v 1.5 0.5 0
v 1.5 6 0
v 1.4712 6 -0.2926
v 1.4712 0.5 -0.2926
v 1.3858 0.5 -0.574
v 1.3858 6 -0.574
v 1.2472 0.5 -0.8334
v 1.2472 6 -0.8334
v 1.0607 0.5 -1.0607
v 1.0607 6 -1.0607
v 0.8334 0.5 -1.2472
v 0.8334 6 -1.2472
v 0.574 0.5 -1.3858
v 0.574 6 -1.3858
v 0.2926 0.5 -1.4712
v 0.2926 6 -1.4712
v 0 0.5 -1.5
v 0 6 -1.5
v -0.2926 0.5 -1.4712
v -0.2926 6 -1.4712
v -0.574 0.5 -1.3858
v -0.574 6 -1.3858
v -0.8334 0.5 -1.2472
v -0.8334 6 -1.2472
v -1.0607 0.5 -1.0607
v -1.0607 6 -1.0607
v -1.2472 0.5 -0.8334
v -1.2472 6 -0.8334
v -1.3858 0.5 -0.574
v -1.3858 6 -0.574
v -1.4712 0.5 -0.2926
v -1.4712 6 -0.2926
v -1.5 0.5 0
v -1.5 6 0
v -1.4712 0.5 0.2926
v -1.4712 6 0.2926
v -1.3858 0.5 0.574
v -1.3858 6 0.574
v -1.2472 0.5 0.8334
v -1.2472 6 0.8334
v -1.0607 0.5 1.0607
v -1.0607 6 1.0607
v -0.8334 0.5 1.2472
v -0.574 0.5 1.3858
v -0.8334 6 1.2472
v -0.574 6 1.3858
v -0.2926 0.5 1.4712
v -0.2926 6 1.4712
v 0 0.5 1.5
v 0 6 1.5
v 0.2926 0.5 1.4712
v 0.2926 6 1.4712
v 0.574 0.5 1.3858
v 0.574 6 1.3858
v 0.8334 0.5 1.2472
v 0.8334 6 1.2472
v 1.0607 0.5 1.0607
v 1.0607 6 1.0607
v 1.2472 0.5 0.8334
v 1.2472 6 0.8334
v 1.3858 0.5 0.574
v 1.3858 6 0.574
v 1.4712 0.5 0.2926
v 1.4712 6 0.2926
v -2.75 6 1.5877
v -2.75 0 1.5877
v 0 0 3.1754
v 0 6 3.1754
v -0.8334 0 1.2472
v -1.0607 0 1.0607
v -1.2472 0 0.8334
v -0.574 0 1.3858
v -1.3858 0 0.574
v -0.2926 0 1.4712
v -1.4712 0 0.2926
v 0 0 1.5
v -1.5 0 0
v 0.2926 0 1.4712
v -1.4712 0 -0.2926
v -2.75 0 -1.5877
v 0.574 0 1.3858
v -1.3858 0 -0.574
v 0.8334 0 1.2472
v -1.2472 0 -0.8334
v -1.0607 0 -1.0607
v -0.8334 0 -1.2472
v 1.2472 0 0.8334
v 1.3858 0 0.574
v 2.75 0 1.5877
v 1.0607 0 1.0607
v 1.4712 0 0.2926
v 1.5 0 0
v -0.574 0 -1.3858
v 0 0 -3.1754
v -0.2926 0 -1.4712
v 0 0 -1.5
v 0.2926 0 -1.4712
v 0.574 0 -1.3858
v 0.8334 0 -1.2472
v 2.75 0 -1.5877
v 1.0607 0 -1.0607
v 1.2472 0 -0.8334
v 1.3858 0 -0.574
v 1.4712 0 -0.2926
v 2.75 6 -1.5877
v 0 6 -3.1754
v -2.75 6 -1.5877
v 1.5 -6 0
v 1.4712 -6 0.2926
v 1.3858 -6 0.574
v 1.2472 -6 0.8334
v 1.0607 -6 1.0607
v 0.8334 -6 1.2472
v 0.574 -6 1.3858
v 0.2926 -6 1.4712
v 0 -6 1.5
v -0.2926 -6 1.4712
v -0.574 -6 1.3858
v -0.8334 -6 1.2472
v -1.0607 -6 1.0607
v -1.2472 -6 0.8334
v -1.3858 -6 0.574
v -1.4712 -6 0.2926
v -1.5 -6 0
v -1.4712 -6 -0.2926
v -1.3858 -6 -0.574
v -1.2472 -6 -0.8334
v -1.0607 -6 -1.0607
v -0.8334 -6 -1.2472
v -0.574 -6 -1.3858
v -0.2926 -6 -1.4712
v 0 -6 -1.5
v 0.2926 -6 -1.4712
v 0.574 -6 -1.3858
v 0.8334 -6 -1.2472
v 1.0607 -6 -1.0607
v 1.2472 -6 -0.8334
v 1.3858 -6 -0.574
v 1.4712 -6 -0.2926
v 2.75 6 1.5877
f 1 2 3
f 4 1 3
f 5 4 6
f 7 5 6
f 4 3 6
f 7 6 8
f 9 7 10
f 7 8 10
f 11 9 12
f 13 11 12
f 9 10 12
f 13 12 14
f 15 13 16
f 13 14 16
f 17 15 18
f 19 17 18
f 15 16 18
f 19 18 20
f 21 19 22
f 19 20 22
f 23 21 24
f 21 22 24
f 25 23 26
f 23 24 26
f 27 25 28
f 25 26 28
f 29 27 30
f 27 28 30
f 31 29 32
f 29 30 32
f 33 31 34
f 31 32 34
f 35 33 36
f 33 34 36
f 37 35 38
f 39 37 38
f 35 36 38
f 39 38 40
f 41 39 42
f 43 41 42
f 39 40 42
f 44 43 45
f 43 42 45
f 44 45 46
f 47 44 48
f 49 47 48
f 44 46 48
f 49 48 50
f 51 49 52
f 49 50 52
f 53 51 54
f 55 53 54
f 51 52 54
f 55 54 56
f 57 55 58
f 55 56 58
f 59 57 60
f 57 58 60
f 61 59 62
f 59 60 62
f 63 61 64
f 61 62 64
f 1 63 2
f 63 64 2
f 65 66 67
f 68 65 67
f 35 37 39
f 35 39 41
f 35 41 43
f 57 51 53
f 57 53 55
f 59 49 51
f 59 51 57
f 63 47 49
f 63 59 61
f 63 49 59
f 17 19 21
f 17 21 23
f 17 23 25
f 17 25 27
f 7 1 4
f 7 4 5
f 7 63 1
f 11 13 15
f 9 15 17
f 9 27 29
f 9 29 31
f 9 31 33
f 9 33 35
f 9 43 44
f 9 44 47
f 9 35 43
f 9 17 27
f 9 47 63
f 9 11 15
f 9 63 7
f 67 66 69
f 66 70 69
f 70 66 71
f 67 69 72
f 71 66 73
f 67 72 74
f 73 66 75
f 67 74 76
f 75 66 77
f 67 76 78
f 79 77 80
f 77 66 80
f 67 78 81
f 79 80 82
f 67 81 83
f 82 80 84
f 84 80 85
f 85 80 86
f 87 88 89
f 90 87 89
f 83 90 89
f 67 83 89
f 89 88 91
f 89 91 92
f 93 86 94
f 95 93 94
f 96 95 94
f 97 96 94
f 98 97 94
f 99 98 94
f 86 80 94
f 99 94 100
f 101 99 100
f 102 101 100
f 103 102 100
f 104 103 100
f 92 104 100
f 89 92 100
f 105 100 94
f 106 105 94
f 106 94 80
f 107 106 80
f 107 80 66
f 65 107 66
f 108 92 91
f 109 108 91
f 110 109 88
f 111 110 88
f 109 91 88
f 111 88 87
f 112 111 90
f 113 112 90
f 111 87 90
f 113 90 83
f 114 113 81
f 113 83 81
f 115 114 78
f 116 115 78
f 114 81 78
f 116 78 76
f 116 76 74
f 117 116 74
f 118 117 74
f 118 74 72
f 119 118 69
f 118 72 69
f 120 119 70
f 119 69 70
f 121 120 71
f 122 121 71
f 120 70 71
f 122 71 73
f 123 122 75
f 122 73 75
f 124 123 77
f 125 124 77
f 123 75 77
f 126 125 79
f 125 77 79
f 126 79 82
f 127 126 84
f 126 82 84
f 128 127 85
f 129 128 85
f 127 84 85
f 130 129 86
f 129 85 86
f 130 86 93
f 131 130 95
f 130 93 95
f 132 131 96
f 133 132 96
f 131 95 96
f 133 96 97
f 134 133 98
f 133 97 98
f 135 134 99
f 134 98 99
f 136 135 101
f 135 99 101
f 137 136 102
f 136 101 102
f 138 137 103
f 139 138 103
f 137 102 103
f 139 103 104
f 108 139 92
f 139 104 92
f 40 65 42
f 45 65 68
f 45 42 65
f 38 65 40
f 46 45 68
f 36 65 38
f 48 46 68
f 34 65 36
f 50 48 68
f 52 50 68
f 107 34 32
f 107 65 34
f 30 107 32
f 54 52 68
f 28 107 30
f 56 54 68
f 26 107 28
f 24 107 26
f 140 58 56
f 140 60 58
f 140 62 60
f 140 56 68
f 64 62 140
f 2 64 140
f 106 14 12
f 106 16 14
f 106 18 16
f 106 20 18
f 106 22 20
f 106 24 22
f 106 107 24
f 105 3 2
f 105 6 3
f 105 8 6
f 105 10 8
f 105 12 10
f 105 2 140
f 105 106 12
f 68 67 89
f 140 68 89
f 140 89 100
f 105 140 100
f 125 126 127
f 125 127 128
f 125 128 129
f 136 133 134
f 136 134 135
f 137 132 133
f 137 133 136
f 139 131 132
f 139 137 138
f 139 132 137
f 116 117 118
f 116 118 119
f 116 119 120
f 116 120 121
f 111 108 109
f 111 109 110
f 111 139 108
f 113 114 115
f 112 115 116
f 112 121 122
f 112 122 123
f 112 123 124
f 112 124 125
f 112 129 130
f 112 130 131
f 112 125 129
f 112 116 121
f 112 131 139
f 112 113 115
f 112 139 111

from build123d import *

# Parameters (mm, degrees)
SALIENTE_EXTRUIR1_DEPTH = 6
CROQUIS2_R              = 1.5
SALIENTE_EXTRUIR2_DEPTH = 6
CROQUIS3_R              = 1.5
CORTAR_EXTRUIR1_DEPTH   = 5.5


with BuildPart() as part:
    # Croquis1 → Saliente-Extruir1 (new body)
    with BuildSketch(Plane(origin=(0, 0, 0), x_dir=(1, 0, 0), z_dir=(0, 1, 0))):
        Polygon((0, 3.175426481), (-2.75, 1.58771324), (-2.75, -1.58771324), (0, -3.175426481), (2.75, -1.58771324), (2.75, 1.58771324), align=None)
    extrude(amount=SALIENTE_EXTRUIR1_DEPTH)

    # Croquis2 → Saliente-Extruir2 (add)
    with BuildSketch(Plane.XZ):
        Circle(CROQUIS2_R)
    extrude(amount=SALIENTE_EXTRUIR2_DEPTH)

    # Croquis3 → Cortar-Extruir1 (cut)
    with BuildSketch(Plane(origin=(0, 6, 0), x_dir=(1, 0, 0), z_dir=(0, 1, 0))):
        Circle(CROQUIS3_R)
    extrude(amount=-CORTAR_EXTRUIR1_DEPTH, mode=Mode.SUBTRACT)


solid = part.part
